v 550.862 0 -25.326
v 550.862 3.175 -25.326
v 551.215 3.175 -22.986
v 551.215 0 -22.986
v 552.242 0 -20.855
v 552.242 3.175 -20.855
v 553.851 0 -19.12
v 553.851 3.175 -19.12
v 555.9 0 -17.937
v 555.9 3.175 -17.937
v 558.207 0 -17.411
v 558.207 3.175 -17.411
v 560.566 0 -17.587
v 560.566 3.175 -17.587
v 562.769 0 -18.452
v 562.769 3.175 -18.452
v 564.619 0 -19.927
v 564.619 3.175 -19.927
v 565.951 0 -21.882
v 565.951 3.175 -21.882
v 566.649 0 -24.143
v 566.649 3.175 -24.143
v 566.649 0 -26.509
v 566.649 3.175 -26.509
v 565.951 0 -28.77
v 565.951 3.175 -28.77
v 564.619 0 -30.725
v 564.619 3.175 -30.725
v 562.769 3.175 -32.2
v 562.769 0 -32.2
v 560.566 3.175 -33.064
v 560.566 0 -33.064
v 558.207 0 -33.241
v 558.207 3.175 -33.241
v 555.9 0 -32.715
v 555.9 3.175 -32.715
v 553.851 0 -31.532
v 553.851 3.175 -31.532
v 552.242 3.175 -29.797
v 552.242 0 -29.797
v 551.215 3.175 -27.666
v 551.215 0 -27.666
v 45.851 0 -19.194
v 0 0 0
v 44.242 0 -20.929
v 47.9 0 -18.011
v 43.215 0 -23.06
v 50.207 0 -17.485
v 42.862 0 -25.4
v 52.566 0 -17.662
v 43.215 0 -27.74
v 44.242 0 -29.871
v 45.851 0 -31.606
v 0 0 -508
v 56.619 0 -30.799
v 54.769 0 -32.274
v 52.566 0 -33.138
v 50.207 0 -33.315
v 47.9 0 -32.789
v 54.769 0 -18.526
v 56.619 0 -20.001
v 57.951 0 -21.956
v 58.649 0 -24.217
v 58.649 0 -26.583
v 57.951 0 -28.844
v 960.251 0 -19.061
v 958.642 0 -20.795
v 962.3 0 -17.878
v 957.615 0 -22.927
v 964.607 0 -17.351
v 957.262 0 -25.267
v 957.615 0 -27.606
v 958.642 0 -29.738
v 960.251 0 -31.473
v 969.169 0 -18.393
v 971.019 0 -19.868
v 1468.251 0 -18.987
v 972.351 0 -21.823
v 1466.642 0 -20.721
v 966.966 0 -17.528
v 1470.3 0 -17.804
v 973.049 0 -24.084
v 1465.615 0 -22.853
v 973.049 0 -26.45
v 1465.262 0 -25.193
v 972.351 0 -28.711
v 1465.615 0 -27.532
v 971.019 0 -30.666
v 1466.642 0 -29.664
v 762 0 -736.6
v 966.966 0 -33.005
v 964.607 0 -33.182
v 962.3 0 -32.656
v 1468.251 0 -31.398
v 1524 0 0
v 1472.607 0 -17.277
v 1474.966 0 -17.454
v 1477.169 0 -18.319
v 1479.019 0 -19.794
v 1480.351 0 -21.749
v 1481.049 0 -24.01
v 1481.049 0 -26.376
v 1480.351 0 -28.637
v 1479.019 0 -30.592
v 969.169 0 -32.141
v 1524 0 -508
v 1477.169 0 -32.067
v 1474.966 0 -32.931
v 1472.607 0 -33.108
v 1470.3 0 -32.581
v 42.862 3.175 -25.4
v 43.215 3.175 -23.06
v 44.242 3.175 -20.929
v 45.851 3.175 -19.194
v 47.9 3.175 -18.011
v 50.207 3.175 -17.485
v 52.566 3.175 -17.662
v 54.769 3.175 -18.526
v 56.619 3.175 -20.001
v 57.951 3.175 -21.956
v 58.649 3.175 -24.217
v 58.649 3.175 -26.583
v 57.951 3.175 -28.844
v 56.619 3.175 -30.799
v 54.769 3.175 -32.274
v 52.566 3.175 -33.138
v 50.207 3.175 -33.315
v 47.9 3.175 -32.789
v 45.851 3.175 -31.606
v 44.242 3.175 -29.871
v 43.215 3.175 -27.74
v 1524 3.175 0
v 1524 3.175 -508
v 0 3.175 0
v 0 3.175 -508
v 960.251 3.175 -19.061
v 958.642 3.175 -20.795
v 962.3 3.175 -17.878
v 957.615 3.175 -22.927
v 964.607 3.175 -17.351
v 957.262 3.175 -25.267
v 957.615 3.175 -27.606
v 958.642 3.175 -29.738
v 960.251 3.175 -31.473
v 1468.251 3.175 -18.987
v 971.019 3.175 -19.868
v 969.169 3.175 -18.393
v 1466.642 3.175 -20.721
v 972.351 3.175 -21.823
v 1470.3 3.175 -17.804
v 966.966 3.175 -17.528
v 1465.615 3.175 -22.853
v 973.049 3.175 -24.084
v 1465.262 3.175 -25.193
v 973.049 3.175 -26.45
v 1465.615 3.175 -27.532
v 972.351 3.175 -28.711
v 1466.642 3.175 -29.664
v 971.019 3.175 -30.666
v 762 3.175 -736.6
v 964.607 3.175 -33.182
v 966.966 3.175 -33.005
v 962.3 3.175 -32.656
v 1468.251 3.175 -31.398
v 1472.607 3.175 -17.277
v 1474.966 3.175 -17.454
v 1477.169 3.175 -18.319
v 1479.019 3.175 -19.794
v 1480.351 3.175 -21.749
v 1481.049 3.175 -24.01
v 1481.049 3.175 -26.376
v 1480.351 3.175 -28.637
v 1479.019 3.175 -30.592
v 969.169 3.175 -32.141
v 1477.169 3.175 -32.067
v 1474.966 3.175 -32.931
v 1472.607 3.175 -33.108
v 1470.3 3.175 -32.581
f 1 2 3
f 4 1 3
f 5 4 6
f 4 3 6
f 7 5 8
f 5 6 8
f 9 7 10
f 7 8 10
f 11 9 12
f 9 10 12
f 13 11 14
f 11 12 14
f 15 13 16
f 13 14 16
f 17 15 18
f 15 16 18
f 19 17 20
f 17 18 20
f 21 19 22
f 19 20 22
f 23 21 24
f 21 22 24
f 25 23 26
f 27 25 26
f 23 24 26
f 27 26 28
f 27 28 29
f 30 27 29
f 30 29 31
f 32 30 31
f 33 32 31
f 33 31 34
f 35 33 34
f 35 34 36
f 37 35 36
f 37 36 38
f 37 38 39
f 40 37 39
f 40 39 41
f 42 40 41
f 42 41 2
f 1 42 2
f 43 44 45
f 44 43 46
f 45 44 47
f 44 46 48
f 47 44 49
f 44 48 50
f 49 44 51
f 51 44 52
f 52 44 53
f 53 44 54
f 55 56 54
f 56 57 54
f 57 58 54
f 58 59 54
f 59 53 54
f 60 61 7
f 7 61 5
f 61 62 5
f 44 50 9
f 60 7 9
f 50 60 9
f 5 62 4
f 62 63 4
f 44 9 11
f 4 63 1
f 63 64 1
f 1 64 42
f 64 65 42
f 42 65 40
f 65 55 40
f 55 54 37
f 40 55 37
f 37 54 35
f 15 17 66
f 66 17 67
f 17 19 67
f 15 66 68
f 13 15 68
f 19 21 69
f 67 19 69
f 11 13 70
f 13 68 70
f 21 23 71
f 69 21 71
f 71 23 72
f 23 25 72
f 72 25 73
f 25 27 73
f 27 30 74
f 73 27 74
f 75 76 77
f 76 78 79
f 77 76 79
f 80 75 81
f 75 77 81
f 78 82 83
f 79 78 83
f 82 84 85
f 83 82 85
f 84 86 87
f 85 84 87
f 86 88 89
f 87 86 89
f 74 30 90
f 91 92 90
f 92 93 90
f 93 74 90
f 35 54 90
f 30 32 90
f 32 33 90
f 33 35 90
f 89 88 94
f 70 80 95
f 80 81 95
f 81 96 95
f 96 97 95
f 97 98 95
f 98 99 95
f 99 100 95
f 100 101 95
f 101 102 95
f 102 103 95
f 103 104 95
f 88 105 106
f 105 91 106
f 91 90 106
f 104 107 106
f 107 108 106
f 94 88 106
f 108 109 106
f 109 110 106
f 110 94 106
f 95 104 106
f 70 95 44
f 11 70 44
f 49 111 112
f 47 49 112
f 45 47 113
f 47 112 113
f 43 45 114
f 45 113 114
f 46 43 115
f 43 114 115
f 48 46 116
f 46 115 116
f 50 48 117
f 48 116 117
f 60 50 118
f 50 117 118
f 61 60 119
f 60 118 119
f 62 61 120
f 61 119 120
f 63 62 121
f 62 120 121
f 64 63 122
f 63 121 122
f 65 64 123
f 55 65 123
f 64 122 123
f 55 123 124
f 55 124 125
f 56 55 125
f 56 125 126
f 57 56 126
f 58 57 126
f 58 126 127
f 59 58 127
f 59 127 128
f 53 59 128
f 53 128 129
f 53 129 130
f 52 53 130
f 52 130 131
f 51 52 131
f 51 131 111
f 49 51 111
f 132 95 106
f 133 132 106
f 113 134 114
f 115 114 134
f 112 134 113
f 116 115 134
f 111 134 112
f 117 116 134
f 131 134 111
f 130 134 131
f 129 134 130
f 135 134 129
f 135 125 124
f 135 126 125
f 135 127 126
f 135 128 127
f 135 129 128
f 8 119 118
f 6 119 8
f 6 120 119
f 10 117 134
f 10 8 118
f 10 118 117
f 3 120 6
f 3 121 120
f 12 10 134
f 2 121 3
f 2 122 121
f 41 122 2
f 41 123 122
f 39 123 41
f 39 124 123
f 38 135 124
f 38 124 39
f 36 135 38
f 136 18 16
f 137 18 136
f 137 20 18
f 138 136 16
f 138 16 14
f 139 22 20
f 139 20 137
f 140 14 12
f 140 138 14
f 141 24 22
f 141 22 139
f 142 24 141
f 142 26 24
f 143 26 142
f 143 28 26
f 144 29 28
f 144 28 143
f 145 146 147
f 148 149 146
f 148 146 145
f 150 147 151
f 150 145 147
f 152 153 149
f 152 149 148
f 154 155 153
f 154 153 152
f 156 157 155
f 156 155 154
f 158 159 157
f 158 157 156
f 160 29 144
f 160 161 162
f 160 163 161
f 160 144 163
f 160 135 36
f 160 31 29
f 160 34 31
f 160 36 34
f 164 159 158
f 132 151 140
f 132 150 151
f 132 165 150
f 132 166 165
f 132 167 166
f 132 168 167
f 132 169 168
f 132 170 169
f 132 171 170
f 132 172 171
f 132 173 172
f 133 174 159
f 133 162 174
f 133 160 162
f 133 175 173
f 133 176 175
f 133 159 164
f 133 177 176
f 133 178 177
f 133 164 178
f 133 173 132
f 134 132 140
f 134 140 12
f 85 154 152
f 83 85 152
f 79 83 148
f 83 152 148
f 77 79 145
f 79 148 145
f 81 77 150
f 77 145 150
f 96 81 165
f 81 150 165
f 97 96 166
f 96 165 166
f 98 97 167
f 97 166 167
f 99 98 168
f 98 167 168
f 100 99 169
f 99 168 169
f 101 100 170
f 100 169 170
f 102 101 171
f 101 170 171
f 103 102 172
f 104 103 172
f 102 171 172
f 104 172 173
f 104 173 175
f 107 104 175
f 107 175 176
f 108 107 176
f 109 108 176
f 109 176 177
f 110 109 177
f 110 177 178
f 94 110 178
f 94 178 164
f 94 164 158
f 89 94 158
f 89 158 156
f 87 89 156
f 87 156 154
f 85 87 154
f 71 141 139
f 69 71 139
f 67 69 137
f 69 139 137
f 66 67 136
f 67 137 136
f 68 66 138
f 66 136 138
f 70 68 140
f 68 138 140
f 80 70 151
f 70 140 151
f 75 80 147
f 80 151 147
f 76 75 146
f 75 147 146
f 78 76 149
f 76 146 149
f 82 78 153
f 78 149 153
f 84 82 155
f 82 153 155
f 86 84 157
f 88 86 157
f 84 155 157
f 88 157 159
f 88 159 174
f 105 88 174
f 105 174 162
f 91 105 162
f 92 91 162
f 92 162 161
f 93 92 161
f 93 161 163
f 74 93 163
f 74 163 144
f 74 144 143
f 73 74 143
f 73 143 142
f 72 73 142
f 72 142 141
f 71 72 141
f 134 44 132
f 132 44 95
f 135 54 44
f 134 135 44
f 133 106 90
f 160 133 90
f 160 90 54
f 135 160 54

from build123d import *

# Parameters (mm, degrees)
BOSS_EXTRUDE1_DEPTH              = 3.175
F_5_8_0_625_DIAMETER_HOLE1_D     = 15.875
F_5_8_0_625_DIAMETER_HOLE1_DEPTH = 3.175


with BuildPart() as part:
    # Sketch1 → Boss-Extrude1 (new body)
    with BuildSketch(Plane(origin=(0, 0, 0), x_dir=(1, 0, 0), z_dir=(0, 1, 0))):
        Polygon((0, 0), (1524, 0), (1524, 508), (762, 736.6), (0, 508), align=None)
    extrude(amount=BOSS_EXTRUDE1_DEPTH)

    # 5/8 (0.625) Diameter Hole1
    with Locations(Plane.XZ):
        with Locations((50.8, -25.4), (558.8, -25.325960299), (965.2, -25.266728538), (1473.2, -25.192688837)):
            Hole(F_5_8_0_625_DIAMETER_HOLE1_D / 2, depth=F_5_8_0_625_DIAMETER_HOLE1_DEPTH)


solid = part.part
